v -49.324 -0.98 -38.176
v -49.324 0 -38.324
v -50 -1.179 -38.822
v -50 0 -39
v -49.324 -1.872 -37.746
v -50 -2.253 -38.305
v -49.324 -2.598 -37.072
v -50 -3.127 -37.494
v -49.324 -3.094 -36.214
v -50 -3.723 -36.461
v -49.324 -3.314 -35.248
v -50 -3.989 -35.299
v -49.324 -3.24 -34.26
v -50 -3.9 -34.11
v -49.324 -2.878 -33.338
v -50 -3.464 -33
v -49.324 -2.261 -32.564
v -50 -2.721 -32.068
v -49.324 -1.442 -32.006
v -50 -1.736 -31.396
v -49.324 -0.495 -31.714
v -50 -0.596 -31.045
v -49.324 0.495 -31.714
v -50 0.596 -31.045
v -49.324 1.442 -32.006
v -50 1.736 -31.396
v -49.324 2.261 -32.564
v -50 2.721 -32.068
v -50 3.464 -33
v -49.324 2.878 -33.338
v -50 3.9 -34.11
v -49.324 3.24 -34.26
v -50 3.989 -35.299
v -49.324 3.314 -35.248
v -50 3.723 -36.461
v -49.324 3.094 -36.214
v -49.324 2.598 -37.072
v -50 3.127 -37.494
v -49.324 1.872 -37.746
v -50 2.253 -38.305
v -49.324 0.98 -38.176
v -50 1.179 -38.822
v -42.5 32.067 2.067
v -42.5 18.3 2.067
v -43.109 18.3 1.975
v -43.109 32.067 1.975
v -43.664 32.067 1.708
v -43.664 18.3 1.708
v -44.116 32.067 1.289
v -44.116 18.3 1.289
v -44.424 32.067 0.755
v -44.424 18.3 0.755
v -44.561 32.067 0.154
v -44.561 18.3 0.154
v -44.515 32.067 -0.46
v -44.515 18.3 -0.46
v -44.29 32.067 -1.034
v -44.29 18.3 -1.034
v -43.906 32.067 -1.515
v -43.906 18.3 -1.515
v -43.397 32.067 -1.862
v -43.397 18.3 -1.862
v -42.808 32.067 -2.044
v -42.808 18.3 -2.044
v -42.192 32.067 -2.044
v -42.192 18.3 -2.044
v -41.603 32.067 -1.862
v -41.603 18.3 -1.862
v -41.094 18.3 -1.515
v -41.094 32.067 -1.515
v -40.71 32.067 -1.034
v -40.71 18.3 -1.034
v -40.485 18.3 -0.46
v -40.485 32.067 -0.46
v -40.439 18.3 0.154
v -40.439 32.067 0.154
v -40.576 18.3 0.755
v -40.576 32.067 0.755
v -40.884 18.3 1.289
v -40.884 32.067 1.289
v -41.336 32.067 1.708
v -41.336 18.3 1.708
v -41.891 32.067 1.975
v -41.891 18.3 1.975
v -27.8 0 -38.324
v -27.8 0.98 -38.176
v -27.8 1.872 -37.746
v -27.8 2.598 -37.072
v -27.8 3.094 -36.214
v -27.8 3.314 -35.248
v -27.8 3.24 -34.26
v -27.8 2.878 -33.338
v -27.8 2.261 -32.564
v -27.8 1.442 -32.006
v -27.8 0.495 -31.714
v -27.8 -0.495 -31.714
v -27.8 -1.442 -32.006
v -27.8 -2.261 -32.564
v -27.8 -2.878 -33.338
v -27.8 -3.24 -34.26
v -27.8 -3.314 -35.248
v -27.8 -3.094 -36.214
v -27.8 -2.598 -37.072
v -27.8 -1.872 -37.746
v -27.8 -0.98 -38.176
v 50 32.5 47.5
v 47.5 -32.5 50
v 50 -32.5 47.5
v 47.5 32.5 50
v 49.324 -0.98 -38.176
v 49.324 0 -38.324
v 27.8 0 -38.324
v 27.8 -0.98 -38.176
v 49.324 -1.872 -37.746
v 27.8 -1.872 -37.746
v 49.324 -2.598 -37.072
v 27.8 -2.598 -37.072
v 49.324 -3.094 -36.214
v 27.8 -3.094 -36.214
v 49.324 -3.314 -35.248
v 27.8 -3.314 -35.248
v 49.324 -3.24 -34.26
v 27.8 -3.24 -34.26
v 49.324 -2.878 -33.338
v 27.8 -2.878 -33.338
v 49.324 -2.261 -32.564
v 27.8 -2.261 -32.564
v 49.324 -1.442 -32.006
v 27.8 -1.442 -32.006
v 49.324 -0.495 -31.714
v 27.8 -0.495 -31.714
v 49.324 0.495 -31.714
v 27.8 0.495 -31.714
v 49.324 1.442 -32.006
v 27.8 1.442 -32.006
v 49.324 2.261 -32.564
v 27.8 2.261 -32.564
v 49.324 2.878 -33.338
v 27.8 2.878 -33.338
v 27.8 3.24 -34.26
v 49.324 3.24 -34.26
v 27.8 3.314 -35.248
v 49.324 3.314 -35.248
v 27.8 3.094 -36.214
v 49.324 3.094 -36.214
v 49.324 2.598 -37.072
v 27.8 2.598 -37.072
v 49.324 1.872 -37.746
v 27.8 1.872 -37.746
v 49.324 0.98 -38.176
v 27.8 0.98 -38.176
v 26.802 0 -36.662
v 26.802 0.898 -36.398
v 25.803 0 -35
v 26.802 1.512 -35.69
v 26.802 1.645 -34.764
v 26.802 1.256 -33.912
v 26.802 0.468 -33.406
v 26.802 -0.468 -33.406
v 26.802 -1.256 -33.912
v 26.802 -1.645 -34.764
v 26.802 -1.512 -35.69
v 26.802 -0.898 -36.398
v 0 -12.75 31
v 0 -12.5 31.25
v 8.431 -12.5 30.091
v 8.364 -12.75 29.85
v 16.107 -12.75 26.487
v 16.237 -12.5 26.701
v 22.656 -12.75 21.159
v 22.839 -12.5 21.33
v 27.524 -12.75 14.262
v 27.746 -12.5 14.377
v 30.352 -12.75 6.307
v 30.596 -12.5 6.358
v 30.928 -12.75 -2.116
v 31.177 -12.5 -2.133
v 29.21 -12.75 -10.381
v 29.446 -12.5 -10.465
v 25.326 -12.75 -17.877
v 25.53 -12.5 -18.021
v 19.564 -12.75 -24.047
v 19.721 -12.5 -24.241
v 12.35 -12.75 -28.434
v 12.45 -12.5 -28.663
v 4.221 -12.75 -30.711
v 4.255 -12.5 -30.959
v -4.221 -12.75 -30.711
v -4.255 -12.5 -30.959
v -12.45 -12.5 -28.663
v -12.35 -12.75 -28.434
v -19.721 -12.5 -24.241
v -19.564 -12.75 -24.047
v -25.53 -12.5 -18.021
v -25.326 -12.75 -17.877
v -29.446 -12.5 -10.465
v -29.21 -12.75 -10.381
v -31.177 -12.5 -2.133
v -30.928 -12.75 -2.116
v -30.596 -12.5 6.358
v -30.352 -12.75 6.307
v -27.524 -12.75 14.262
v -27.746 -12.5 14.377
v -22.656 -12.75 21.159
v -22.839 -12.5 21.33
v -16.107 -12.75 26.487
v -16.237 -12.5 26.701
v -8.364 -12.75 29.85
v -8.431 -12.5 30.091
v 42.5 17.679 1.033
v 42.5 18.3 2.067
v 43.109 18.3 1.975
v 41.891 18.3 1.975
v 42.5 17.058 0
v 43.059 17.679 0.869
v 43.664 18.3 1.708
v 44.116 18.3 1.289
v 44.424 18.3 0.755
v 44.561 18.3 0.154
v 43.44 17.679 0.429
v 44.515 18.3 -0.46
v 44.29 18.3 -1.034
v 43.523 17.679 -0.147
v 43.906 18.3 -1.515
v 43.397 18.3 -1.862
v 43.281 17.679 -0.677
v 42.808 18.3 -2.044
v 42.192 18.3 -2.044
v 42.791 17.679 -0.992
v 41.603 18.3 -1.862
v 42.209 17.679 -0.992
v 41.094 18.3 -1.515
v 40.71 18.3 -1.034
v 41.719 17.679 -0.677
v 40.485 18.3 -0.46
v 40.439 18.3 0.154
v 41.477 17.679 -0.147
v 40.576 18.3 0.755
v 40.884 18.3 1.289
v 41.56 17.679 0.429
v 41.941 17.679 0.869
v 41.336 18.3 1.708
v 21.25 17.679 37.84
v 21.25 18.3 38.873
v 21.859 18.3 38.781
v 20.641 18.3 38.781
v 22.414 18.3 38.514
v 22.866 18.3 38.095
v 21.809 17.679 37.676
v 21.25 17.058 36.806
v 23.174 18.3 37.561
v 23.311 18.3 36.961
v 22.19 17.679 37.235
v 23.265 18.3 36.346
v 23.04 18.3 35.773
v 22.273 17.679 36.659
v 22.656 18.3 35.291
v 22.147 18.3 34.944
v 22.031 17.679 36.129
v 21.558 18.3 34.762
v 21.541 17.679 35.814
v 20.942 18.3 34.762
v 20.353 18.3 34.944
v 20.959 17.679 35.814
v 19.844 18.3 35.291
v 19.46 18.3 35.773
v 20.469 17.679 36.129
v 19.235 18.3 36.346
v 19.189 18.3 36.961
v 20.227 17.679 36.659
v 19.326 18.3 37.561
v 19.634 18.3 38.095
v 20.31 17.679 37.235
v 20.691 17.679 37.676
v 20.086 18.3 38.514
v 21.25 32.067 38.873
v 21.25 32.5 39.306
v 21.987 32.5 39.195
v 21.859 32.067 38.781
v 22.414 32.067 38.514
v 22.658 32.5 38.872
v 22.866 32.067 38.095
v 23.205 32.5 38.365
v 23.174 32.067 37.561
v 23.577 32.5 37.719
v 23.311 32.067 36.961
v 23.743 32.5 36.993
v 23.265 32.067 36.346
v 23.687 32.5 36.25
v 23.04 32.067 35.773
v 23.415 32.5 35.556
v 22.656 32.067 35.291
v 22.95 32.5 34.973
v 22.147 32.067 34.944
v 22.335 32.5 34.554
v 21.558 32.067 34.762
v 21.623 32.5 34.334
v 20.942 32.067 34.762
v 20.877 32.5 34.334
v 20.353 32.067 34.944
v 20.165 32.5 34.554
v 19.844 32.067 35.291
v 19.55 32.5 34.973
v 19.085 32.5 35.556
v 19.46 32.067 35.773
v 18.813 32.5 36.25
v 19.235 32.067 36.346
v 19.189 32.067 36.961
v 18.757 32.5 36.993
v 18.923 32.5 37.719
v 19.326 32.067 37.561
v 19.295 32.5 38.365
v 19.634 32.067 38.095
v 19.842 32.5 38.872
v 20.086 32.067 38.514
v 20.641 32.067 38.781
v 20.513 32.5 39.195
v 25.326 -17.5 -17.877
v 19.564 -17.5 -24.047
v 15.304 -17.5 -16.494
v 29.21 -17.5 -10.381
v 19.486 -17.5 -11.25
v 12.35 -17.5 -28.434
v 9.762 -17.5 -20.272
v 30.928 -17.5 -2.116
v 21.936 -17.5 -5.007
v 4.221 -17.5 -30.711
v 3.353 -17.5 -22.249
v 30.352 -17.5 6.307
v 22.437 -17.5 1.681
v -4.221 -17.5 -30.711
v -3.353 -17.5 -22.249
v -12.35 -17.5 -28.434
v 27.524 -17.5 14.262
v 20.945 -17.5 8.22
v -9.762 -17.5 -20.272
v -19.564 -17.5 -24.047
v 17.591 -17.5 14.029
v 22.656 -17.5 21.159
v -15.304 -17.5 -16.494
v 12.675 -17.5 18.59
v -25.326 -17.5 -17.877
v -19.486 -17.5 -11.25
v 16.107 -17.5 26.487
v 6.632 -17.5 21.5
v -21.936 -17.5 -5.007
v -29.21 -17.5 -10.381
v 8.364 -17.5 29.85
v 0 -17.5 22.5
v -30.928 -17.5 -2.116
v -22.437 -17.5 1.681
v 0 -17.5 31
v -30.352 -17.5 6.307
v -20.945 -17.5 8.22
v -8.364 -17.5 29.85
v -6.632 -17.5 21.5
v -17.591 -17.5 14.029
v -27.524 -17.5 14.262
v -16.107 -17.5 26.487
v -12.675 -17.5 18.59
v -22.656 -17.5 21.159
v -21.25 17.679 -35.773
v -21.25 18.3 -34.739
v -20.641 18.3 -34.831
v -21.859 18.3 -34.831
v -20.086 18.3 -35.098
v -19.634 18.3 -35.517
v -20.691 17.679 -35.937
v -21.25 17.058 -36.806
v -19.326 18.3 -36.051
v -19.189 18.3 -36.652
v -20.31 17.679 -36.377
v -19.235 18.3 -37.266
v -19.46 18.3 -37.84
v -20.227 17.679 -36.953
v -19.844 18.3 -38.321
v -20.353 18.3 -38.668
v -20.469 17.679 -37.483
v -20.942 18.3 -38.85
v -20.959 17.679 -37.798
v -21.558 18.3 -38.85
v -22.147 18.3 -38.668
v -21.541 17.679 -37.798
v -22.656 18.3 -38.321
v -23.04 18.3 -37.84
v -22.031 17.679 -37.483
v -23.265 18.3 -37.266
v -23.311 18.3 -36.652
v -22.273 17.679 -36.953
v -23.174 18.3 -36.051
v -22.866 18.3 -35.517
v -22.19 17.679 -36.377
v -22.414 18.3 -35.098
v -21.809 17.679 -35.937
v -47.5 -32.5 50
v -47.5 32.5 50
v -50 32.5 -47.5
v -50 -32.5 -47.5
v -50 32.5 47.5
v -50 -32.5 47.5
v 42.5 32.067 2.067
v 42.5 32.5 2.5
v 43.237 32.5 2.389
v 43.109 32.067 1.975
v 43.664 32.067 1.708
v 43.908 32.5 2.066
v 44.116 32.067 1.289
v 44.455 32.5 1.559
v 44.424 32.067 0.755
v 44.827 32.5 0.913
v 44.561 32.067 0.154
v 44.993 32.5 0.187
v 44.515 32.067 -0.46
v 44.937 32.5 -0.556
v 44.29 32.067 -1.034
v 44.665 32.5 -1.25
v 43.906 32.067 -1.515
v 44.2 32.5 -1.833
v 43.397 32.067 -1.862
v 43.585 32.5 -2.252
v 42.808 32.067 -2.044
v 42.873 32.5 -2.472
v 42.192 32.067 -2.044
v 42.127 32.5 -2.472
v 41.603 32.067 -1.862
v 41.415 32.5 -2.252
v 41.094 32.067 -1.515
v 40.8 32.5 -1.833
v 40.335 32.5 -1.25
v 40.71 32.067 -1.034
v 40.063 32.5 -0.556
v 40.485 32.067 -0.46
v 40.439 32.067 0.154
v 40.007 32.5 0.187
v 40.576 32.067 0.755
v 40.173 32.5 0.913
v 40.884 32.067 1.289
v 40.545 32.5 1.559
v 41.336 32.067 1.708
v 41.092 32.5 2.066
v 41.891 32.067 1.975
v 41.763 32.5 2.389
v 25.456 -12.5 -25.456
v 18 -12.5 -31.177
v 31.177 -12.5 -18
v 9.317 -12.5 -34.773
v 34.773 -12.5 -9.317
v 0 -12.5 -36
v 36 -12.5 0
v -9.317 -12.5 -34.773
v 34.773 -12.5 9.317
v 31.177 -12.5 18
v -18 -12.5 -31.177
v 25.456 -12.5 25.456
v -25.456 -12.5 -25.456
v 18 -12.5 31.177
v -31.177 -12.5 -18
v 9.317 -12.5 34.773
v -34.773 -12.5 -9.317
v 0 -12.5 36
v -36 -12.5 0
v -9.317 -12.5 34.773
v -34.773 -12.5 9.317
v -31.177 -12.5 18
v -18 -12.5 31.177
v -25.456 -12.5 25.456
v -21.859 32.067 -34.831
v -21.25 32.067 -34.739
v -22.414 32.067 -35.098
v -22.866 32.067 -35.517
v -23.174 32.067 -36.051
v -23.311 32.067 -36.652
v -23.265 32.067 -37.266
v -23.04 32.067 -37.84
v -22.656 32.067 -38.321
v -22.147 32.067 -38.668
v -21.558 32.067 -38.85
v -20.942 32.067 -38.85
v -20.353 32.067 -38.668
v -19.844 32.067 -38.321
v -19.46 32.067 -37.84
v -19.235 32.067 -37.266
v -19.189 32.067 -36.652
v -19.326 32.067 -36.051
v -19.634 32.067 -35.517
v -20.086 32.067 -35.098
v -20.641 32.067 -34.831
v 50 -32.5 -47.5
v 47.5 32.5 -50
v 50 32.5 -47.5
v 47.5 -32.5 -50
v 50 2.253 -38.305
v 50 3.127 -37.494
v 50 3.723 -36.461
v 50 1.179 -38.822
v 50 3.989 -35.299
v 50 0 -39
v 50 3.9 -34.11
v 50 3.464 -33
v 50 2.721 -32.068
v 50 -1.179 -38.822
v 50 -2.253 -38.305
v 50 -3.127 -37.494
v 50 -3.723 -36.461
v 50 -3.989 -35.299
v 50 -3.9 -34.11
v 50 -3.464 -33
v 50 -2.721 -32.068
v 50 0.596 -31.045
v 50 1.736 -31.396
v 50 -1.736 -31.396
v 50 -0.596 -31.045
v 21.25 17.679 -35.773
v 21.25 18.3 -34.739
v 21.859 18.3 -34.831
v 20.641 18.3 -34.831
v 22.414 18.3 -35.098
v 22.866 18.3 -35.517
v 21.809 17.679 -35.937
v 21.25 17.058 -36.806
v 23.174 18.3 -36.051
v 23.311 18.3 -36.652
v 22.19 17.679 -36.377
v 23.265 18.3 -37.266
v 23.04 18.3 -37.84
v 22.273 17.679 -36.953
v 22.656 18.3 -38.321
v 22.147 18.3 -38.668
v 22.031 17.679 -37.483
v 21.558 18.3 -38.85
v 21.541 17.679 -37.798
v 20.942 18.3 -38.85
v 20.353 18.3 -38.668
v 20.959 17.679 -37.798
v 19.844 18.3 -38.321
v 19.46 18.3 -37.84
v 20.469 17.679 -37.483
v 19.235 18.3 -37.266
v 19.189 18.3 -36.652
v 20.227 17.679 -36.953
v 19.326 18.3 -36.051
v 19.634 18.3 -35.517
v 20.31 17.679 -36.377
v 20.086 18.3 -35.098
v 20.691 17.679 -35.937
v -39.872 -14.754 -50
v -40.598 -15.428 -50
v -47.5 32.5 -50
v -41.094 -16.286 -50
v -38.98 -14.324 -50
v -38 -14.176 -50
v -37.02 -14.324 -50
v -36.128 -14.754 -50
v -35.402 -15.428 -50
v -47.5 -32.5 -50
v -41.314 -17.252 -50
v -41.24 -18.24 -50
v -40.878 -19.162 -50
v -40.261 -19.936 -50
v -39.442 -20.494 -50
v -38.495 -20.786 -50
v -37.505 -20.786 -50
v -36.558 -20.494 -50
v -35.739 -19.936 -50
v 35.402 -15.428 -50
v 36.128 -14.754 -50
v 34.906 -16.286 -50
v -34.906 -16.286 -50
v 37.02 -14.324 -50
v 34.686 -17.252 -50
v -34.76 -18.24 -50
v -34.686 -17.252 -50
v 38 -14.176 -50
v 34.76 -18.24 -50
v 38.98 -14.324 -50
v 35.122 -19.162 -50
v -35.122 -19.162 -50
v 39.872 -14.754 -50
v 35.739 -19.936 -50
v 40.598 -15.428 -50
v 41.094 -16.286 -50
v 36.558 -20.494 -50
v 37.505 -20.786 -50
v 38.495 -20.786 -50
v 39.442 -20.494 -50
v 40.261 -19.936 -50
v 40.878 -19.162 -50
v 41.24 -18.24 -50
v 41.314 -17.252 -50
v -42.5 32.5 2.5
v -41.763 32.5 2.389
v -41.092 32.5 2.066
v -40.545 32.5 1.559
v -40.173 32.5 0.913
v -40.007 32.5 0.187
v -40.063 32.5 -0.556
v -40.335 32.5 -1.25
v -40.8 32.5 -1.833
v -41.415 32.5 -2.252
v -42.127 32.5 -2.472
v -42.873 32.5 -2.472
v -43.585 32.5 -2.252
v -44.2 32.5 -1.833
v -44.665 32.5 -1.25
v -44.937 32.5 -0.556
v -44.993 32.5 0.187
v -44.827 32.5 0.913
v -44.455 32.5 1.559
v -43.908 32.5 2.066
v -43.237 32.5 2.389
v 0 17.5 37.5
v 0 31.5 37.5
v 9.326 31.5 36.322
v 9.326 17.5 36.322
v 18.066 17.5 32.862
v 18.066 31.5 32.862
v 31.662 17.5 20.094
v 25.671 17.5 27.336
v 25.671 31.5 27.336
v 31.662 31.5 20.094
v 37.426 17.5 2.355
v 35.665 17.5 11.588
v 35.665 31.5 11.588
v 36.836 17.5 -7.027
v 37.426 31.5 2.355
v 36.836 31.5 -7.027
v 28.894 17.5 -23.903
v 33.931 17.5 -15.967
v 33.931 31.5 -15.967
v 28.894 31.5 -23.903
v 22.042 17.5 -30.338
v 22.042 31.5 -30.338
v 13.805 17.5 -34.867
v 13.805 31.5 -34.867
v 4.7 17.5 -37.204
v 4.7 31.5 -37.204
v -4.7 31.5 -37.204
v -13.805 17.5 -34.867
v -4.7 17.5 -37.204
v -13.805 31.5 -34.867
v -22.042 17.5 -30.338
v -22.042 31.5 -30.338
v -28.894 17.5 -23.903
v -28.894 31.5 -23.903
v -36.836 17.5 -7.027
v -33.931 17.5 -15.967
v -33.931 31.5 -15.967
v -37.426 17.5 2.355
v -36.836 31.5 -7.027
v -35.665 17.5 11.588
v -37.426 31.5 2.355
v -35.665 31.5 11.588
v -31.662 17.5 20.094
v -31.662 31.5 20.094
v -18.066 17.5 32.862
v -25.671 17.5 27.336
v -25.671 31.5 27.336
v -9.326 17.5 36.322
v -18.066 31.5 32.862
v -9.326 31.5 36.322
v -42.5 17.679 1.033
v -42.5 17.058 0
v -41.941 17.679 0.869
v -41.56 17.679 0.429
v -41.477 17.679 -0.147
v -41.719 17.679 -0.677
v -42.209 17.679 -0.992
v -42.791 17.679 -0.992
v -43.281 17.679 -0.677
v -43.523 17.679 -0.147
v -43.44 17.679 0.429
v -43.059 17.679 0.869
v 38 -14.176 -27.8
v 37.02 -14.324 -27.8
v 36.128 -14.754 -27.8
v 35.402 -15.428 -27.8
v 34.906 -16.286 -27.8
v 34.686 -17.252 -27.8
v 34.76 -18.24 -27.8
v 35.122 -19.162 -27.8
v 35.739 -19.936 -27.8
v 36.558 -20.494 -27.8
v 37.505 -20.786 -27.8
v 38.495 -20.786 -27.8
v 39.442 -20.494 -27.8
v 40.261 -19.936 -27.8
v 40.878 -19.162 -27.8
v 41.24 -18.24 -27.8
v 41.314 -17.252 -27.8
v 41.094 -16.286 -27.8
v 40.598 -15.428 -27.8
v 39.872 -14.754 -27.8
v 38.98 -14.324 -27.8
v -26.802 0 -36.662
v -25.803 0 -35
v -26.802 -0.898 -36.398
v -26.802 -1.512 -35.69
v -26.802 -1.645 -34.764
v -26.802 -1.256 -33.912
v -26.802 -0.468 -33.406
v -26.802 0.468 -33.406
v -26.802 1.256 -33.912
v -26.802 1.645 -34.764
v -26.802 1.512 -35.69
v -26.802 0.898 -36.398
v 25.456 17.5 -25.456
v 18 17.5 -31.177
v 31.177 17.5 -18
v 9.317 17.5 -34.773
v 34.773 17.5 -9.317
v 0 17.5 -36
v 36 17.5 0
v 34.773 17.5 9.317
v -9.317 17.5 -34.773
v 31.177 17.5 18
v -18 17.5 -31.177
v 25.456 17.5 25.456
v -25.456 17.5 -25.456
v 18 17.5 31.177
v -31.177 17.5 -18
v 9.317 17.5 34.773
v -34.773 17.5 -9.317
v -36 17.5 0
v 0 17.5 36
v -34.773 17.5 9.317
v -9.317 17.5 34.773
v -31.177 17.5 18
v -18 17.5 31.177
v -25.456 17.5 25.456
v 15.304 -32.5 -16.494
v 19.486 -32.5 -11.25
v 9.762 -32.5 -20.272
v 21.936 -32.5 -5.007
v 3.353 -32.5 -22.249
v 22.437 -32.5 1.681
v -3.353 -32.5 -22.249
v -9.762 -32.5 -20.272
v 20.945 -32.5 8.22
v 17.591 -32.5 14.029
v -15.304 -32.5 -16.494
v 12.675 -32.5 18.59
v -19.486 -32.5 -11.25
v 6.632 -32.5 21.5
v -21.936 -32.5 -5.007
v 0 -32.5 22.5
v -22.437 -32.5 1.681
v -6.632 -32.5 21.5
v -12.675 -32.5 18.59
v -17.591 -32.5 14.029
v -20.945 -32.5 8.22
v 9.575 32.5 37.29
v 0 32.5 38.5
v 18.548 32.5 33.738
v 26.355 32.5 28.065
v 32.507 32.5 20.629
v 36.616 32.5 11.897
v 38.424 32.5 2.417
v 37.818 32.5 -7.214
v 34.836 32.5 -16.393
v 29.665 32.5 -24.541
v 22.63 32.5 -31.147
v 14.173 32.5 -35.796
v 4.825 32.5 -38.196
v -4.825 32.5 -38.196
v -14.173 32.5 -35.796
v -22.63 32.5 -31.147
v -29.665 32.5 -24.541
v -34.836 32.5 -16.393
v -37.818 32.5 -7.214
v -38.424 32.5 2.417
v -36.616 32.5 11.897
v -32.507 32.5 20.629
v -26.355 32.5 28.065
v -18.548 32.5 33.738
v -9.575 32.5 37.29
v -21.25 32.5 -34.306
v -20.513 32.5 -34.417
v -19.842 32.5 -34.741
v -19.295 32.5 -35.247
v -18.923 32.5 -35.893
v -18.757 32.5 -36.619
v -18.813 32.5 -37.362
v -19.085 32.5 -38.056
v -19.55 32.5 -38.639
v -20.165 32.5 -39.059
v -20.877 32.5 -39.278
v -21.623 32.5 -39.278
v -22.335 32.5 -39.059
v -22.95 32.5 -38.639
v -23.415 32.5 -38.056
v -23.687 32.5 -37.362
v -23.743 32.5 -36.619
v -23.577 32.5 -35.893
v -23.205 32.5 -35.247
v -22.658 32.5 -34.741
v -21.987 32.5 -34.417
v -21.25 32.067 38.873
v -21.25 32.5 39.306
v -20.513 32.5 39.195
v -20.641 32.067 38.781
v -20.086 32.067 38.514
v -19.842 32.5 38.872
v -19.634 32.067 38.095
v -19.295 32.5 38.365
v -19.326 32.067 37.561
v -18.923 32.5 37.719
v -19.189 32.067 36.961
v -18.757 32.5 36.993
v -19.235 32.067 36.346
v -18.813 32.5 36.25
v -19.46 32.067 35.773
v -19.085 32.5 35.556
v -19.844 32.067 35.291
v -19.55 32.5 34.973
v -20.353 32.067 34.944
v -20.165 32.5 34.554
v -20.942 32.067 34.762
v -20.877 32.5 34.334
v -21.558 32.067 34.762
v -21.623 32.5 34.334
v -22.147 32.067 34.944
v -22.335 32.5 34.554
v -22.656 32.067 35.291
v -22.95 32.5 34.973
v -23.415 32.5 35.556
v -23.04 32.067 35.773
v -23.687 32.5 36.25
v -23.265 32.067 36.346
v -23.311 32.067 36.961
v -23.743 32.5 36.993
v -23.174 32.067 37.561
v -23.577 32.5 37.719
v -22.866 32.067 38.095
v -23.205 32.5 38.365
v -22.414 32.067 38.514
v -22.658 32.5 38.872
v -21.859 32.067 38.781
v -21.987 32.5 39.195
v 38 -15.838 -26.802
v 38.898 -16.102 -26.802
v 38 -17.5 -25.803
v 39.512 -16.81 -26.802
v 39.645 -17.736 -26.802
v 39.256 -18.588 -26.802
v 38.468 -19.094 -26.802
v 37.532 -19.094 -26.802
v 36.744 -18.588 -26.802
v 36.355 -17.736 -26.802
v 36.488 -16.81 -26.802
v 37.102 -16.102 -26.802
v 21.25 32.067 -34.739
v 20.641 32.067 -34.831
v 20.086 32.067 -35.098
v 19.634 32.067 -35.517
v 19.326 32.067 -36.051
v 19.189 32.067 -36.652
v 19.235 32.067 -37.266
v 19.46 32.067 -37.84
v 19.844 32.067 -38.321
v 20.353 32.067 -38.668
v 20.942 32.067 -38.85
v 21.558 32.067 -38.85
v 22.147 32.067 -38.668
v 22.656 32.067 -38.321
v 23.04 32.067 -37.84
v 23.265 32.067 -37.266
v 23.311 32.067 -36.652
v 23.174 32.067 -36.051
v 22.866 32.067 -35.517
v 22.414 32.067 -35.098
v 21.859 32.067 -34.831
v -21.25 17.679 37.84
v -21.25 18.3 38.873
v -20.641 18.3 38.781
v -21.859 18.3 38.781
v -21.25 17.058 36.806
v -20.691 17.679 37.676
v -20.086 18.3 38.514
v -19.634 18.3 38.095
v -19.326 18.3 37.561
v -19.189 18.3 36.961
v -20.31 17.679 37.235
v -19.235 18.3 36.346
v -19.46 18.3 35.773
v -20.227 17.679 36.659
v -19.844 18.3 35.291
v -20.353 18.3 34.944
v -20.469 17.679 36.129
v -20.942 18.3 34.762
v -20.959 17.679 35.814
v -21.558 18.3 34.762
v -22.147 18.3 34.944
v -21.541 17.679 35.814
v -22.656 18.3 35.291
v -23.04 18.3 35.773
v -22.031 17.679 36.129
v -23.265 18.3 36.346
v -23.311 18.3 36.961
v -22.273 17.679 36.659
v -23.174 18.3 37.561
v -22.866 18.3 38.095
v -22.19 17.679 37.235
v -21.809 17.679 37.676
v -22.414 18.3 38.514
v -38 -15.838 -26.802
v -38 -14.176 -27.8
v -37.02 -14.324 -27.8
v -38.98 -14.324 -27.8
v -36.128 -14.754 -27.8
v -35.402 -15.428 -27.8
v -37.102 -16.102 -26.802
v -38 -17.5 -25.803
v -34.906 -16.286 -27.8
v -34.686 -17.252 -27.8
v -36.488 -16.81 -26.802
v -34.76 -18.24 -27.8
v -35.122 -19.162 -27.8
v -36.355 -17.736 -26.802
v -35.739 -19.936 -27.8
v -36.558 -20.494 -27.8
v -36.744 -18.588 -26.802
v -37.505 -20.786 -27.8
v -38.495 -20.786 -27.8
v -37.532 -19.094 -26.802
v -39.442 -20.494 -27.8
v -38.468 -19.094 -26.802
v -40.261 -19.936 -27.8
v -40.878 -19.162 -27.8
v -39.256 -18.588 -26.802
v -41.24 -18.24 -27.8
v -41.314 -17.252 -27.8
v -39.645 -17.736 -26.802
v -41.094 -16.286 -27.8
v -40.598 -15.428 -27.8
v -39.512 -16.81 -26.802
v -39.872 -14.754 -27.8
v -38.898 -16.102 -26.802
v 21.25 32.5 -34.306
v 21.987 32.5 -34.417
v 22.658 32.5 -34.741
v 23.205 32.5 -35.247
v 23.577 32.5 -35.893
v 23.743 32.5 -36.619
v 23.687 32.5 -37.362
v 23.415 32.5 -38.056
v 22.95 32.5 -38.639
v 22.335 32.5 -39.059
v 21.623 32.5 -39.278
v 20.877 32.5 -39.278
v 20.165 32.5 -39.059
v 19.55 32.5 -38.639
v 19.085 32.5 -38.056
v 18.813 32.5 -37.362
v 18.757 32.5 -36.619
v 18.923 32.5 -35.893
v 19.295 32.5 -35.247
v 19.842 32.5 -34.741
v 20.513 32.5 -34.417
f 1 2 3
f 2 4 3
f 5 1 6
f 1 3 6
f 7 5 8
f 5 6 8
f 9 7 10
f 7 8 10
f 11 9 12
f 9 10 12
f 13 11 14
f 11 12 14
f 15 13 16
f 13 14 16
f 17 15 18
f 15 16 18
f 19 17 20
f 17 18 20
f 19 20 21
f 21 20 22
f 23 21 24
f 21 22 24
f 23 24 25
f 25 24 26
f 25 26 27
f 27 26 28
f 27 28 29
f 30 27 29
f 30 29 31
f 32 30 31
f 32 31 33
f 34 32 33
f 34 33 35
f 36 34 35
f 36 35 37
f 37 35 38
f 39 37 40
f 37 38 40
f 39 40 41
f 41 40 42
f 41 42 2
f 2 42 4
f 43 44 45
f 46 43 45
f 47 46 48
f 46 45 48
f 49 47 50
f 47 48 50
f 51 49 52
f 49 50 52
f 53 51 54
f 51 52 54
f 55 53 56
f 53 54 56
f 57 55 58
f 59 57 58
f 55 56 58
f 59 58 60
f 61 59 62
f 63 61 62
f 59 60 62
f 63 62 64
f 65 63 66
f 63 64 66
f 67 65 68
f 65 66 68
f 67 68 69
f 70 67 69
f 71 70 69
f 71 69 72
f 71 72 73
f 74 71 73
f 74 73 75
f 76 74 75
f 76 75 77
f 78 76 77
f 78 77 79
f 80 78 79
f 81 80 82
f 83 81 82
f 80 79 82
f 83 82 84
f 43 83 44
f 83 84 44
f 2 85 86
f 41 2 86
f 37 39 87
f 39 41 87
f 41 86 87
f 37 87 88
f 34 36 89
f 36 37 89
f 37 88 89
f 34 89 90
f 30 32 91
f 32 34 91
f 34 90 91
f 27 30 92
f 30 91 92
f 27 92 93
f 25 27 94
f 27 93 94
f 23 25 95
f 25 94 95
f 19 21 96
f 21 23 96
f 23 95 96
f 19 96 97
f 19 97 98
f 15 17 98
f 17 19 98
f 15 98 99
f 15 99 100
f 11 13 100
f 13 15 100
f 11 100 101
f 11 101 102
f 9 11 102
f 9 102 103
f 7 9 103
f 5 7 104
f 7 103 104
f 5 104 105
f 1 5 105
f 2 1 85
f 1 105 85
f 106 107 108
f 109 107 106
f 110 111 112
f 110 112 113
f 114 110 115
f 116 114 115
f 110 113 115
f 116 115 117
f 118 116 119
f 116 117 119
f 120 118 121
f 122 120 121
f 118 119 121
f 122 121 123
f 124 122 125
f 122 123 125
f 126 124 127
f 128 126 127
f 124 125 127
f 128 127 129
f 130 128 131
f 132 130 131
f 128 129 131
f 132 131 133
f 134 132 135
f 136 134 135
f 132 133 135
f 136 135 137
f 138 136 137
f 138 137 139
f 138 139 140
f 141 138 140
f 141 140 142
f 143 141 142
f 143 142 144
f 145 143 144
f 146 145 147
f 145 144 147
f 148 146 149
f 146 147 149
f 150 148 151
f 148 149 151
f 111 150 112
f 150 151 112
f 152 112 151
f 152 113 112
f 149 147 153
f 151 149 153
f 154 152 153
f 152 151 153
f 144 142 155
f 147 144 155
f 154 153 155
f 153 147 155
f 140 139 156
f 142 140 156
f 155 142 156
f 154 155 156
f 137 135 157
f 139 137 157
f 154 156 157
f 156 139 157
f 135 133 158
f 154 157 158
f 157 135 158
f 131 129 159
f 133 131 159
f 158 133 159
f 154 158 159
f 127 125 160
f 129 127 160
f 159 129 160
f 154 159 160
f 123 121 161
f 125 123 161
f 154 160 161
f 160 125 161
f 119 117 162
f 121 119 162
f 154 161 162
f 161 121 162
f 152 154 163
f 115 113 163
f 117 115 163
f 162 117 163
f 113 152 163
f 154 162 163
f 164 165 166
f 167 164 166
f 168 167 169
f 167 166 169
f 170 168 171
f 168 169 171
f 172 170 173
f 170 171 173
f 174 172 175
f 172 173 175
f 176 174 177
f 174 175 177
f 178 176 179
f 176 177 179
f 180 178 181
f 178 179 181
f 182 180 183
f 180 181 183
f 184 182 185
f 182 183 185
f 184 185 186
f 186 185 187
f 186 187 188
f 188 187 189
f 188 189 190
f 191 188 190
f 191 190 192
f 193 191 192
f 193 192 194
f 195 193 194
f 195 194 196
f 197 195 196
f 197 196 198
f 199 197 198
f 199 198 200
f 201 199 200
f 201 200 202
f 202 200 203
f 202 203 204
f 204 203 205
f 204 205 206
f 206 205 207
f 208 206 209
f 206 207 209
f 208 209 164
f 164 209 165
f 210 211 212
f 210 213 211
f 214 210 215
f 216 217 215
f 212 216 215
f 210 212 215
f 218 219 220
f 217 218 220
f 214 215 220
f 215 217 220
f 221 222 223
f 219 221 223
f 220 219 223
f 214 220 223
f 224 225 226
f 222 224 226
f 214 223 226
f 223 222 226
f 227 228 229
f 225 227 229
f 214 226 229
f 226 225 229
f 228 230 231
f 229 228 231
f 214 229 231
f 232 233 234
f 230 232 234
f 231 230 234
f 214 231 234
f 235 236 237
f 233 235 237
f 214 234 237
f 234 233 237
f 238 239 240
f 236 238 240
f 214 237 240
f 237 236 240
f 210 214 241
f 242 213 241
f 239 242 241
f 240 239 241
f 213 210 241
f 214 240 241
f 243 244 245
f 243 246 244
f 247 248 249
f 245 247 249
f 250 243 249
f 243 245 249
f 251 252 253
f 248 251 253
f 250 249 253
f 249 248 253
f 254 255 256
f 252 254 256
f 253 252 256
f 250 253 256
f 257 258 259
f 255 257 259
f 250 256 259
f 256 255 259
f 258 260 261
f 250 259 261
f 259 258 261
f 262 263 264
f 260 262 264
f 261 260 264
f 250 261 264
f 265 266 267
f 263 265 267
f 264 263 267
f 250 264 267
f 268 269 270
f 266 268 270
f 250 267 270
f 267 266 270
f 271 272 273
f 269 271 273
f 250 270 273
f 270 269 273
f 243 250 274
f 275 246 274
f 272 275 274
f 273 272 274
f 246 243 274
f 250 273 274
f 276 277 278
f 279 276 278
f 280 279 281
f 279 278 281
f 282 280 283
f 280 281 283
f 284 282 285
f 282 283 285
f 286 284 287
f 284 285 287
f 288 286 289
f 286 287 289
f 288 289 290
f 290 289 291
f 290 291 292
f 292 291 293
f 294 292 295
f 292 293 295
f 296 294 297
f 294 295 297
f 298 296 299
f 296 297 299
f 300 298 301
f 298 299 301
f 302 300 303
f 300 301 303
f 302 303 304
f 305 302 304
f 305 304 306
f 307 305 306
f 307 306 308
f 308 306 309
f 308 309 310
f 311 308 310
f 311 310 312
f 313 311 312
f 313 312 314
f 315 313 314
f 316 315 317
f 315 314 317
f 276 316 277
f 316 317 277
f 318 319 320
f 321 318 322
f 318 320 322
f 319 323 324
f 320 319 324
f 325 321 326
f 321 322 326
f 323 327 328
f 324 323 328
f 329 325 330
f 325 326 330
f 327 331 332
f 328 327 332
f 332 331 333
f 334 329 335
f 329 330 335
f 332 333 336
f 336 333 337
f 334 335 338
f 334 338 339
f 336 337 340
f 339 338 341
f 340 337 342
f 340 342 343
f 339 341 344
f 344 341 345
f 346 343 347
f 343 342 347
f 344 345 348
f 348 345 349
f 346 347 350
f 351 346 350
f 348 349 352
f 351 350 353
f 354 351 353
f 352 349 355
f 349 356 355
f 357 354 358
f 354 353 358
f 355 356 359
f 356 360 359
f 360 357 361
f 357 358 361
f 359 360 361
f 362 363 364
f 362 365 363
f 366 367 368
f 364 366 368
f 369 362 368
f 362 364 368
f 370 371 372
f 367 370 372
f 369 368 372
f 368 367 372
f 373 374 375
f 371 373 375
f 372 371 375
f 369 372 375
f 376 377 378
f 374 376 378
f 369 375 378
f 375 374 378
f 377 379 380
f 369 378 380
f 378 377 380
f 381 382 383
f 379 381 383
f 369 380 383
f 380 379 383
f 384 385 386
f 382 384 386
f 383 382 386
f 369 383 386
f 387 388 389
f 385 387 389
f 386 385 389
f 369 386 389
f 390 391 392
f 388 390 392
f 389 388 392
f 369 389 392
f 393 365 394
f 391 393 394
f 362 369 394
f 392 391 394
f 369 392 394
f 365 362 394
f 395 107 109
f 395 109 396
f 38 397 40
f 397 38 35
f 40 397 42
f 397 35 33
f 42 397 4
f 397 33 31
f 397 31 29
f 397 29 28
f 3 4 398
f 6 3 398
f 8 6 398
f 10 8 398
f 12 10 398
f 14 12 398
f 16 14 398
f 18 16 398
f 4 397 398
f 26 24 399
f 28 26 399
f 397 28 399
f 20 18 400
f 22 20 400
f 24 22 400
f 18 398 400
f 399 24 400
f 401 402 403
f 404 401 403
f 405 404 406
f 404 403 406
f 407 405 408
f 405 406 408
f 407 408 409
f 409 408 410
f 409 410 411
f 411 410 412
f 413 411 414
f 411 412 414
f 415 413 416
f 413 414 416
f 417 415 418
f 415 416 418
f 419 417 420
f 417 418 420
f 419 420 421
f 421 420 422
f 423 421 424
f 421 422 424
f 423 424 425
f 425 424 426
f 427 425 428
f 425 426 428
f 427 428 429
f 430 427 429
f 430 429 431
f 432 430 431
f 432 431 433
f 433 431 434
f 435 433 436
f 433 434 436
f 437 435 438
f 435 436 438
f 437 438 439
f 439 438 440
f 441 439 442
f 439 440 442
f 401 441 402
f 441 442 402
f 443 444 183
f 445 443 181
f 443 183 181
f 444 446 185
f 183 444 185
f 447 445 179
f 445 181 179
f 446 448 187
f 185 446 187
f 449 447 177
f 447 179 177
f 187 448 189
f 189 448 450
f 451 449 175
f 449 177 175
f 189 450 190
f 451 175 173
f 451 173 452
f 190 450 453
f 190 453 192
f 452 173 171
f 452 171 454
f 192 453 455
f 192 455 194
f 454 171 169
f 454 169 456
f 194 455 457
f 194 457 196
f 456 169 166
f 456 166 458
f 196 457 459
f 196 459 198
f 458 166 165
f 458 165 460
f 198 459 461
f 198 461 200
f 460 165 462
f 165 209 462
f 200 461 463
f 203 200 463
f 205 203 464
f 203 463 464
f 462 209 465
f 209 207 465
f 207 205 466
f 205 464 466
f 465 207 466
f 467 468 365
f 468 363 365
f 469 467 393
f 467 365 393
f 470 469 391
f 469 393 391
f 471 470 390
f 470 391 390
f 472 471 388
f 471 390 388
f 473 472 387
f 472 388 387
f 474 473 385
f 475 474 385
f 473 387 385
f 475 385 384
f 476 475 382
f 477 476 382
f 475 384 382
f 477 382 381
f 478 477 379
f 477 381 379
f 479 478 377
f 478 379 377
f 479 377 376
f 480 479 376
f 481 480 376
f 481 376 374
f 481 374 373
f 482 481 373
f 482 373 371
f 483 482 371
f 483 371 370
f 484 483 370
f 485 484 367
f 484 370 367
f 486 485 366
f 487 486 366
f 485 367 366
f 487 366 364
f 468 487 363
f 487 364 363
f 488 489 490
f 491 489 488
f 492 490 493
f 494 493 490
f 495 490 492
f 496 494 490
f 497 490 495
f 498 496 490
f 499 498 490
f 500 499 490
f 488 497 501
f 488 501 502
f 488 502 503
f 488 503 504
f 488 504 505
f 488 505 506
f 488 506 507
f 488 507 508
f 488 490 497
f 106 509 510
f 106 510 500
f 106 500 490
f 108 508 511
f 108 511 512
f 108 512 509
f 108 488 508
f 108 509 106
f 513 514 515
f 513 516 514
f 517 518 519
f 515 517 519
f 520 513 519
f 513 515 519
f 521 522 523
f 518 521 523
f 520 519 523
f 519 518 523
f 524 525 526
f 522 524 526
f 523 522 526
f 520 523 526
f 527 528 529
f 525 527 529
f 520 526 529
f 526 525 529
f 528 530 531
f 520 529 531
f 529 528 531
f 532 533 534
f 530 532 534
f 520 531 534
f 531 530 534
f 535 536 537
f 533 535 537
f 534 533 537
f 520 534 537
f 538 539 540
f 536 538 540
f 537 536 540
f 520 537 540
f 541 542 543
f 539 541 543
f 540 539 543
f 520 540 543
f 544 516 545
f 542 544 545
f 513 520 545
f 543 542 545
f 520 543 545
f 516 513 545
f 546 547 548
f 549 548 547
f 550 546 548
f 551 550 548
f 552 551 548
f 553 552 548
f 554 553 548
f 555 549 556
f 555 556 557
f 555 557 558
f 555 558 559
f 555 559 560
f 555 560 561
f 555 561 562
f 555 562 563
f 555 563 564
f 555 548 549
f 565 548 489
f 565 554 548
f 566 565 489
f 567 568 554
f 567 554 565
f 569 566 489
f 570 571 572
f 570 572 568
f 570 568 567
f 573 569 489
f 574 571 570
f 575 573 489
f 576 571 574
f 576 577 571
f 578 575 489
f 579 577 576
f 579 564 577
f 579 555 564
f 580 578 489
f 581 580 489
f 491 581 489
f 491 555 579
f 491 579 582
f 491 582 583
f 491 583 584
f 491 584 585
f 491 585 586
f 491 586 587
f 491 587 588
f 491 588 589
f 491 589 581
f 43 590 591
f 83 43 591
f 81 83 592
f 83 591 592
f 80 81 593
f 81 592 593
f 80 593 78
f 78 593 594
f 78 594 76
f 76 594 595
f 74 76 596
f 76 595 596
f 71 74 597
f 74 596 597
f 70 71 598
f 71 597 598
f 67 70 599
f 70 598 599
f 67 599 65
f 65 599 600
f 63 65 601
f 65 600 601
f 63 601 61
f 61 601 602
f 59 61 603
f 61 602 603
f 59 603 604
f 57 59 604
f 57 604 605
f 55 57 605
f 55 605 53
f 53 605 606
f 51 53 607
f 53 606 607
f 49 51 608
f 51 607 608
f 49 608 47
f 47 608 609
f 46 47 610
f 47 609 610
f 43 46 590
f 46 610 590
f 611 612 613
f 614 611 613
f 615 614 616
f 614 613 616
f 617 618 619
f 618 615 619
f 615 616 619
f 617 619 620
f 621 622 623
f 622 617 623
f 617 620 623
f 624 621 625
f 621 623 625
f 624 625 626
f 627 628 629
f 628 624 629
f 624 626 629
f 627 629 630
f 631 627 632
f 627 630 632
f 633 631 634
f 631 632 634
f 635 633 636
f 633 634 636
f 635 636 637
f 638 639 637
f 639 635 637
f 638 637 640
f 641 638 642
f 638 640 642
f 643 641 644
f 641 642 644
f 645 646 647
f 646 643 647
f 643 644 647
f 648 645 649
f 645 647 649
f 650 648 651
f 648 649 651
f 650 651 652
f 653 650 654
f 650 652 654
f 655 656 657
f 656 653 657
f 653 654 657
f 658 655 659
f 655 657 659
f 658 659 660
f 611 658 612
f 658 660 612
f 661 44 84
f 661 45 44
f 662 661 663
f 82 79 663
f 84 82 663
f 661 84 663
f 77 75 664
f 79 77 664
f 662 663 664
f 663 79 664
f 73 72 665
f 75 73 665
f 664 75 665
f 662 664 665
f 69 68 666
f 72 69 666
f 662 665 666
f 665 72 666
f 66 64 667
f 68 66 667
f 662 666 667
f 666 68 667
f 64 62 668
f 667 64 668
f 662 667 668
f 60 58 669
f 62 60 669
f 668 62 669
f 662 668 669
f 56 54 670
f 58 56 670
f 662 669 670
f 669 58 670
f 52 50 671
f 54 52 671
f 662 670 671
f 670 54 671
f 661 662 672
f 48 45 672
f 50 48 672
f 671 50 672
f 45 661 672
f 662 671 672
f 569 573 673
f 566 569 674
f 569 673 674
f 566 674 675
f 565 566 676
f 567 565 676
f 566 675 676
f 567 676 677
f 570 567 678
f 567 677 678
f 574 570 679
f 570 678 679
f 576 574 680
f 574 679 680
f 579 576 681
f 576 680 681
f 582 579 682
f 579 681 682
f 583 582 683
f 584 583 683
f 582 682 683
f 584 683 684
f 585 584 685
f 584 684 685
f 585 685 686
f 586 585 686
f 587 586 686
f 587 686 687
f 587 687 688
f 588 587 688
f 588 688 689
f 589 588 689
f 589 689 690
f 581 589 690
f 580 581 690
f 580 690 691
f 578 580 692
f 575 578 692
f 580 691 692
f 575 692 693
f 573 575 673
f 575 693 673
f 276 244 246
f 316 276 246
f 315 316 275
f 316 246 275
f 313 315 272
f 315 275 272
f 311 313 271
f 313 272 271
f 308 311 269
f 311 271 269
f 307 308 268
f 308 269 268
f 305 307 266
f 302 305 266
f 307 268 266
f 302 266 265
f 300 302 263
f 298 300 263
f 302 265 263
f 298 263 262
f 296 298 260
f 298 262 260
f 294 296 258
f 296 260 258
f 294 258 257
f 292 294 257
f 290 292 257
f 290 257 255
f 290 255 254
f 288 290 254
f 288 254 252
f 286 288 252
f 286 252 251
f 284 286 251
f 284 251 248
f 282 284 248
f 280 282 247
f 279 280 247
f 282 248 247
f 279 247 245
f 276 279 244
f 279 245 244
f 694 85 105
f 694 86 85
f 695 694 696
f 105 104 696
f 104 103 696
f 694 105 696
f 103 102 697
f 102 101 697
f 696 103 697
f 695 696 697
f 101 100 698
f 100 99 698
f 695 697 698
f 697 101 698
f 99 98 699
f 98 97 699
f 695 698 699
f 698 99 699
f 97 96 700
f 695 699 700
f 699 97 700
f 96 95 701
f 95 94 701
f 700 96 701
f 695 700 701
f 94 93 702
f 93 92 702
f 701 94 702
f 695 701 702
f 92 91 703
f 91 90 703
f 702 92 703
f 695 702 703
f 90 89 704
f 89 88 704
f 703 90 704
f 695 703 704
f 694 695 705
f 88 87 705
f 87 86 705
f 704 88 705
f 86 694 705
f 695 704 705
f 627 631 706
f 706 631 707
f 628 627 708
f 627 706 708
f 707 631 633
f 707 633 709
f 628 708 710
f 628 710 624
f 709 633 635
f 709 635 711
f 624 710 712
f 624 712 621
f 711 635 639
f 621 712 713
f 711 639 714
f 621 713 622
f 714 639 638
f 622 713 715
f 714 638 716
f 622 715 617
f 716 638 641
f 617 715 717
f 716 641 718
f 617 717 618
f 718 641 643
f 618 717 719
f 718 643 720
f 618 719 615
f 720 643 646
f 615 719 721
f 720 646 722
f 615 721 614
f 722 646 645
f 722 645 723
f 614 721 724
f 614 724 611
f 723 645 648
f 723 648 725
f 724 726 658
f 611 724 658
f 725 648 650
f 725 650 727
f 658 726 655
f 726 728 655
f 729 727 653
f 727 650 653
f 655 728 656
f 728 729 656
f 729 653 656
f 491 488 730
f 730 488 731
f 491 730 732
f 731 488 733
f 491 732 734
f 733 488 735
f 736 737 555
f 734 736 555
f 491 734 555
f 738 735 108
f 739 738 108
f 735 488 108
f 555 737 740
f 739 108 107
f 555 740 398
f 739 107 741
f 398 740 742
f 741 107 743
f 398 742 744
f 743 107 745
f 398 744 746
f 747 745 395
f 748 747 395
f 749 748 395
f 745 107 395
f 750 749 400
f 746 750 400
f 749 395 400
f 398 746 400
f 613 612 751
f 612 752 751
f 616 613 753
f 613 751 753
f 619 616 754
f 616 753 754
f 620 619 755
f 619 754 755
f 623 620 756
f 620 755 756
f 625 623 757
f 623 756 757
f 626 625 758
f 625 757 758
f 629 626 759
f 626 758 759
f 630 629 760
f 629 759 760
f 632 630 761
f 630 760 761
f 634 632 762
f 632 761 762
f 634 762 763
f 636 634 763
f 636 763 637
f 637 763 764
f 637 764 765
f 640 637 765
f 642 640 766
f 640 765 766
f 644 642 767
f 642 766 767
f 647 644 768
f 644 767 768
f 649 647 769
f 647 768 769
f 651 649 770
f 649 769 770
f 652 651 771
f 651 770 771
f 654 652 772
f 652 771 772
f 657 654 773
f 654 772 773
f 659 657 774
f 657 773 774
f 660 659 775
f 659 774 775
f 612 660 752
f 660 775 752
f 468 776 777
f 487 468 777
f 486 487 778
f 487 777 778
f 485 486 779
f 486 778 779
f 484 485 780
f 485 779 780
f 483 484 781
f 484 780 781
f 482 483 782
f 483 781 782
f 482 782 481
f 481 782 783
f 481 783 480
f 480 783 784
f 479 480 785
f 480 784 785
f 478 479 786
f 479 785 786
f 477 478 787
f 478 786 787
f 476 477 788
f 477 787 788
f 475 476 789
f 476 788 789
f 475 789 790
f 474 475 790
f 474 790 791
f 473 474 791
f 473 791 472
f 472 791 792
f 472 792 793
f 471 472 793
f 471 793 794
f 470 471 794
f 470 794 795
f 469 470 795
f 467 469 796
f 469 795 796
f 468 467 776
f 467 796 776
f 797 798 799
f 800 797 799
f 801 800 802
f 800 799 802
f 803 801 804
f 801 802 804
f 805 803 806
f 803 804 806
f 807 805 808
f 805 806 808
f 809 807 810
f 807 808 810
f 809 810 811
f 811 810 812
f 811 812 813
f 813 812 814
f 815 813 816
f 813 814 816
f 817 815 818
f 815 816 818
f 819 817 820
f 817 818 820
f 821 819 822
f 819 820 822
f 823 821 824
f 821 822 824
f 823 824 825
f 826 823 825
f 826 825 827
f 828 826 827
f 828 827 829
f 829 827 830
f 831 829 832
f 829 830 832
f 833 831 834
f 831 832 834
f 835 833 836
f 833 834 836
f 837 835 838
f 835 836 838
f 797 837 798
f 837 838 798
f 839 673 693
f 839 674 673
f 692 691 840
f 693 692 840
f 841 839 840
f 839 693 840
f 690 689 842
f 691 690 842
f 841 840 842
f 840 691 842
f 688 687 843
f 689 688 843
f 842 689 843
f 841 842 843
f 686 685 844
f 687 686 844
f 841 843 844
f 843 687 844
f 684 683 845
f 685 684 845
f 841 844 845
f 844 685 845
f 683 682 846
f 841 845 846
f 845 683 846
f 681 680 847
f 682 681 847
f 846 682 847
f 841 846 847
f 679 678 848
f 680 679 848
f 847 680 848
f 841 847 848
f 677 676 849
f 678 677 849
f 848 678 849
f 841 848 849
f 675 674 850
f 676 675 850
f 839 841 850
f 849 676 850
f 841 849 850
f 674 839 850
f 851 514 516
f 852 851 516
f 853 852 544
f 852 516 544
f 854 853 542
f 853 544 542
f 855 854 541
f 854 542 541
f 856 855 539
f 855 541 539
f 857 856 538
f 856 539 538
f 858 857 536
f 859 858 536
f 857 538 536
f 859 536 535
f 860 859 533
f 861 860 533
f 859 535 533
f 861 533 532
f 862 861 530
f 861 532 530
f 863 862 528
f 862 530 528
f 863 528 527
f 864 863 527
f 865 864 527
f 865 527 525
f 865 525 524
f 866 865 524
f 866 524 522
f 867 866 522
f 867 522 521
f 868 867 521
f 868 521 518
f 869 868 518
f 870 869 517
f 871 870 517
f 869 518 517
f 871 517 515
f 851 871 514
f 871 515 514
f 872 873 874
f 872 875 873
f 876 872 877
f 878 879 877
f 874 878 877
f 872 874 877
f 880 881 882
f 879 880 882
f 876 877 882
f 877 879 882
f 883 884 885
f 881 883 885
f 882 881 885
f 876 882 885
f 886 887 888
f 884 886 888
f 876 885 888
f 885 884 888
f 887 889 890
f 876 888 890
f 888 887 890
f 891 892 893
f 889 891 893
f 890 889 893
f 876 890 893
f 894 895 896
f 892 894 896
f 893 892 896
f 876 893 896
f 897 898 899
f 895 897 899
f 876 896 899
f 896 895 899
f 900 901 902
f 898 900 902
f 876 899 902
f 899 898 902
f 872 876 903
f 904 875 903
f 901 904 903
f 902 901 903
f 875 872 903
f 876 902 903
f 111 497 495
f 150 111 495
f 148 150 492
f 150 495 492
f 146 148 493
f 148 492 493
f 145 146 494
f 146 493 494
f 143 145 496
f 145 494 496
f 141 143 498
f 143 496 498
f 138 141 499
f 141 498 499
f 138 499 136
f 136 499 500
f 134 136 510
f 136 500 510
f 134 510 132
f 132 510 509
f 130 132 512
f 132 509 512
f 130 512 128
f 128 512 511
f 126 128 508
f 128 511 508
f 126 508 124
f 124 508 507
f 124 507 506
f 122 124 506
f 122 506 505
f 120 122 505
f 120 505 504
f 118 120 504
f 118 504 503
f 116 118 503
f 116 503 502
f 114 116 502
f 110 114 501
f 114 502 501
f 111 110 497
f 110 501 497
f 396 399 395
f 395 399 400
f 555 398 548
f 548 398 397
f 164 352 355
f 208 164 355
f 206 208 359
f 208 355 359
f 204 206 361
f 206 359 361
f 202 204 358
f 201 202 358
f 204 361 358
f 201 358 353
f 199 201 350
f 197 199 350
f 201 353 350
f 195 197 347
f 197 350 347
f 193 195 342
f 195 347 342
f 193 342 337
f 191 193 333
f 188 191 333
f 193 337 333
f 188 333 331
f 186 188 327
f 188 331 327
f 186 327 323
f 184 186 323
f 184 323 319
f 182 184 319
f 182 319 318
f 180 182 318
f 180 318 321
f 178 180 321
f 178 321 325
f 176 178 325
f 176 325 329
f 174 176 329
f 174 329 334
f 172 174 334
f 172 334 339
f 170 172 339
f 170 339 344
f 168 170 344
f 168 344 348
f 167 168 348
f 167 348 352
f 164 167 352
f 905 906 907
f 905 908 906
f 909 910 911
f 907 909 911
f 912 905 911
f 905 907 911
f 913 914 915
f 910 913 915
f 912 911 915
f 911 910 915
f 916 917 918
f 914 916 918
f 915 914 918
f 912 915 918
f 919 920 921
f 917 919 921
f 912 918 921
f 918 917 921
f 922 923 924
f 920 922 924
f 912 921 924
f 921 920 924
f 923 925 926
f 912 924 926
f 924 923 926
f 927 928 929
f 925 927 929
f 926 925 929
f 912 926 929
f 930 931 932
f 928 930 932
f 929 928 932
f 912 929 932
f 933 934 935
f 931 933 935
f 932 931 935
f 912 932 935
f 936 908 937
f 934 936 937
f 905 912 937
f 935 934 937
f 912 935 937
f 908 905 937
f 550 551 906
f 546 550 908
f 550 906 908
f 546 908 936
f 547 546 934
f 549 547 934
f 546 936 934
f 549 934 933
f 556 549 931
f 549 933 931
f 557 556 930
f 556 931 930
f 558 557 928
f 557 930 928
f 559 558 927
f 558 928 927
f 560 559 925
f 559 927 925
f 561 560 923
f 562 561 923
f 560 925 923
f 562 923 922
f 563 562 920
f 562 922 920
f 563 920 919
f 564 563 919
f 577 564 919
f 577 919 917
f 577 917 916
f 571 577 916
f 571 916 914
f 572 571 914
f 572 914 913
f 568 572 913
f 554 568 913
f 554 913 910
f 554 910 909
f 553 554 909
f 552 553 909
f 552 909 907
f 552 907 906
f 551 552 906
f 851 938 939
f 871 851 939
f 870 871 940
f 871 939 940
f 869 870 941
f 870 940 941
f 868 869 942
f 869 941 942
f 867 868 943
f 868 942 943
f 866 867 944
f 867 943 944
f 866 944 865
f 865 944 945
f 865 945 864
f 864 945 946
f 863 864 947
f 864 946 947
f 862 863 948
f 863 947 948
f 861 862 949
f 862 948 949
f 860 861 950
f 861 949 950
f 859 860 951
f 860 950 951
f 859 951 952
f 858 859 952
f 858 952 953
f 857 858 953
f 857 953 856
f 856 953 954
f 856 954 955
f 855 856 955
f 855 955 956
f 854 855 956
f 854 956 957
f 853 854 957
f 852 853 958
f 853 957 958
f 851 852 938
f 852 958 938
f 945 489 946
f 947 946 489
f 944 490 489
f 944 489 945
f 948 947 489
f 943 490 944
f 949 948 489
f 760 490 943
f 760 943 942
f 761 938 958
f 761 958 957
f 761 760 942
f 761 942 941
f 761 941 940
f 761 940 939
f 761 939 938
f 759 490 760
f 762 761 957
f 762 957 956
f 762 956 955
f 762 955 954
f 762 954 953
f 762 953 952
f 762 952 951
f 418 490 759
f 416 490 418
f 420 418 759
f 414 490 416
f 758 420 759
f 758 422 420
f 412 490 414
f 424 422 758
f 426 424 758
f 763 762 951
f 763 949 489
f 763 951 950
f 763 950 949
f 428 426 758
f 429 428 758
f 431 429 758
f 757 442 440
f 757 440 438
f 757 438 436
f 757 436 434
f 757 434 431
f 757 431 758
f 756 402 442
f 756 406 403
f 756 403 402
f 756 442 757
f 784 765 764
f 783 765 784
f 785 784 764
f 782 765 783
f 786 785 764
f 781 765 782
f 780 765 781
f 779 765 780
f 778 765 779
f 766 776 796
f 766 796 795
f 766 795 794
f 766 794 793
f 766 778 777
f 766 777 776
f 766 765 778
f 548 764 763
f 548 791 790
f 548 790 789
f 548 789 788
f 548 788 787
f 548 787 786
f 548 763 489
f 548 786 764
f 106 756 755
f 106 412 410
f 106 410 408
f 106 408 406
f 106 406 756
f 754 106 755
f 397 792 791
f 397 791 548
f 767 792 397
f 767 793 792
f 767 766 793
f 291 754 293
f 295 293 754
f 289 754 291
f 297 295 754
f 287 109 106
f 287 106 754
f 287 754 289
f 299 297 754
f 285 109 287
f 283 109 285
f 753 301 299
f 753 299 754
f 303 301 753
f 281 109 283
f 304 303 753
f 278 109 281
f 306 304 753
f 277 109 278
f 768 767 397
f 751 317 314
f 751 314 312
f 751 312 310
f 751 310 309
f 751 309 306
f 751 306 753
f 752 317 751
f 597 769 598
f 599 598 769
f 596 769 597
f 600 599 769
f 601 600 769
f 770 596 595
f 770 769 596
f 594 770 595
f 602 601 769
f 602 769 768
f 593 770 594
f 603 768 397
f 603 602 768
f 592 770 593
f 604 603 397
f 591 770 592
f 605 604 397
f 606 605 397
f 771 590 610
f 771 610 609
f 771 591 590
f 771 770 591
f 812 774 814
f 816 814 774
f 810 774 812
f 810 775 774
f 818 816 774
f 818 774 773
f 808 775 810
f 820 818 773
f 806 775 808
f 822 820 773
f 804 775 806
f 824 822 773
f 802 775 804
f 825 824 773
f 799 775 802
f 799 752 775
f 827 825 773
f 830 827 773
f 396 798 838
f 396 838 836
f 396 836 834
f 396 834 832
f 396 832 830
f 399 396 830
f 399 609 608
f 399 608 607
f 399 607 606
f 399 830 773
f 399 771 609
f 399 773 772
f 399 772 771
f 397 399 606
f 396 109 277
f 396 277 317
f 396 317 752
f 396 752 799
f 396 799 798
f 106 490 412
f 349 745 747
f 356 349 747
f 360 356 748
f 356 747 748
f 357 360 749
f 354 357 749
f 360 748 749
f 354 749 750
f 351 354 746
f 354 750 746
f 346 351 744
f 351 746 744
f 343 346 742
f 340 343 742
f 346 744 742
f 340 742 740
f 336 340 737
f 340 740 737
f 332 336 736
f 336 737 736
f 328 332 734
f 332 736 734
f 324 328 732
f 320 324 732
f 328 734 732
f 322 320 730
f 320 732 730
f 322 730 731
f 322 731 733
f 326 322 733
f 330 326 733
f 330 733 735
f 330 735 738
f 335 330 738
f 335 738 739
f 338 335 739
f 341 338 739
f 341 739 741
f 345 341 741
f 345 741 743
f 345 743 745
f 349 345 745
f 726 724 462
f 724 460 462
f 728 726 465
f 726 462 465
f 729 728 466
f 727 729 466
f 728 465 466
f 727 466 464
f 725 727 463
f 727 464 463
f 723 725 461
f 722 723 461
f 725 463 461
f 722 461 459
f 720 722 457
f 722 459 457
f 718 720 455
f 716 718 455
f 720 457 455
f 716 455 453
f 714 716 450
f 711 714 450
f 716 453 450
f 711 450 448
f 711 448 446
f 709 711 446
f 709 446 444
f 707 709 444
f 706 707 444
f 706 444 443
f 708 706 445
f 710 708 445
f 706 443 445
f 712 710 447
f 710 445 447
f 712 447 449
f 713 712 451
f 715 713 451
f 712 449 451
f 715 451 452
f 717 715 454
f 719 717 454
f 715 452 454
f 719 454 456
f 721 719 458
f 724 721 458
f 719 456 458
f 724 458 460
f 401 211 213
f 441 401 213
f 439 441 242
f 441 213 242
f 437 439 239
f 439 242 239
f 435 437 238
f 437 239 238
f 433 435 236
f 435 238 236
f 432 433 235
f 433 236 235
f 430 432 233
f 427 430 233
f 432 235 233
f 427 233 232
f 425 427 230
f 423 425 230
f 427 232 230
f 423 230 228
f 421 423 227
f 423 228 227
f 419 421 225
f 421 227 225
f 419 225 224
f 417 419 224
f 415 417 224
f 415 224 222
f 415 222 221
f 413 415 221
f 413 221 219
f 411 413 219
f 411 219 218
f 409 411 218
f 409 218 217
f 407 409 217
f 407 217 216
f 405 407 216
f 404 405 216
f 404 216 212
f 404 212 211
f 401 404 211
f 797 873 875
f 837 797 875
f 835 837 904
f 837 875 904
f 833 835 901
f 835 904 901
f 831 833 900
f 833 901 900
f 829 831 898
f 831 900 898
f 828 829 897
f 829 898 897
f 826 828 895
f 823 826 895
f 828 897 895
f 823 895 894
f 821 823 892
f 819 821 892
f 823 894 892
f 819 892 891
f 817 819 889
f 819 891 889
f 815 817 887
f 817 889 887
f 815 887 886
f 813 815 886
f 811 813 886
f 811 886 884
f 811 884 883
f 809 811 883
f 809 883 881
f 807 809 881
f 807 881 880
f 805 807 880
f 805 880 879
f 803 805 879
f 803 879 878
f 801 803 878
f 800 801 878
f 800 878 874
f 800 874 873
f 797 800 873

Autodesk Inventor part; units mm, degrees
ref_plane "YZ Plane" through (0, 0, 0) normal (1, 0, 0) x (0, 1, 0)
ref_plane "XZ Plane" through (0, 0, 0) normal (0, 1, 0) x (-1, 0, 0)
ref_plane "XY Plane" through (0, 0, 0) normal (0, 0, 1) x (1, 0, 0)
sketch "Skizze1" plane through (0, 0, 0) normal (0, 1, 0) x (-1, 0, 0)
  line L0 (0, -50) -> (-50, -50)
  line L1 (-50, -50) -> (-50, 50)
  line L2 (-50, 50) -> (0, 50)
  line L3 (0, -50) -> (50, -50)
  line L4 (50, -50) -> (50, 50)
  line L5 (50, 50) -> (0, 50)
  line L6 (-122.5, 0) -> (122.5, 0) construction
  line L7 (0, -77.2) -> (0, 113.2) construction
  dimension "d1" = 100
  dimension "d3" = 100
extrude "Grundkoerper" add sketch "Skizze1" along normal mid plane 65
sketch "Skizze2" plane through (0, -32.5, 0) normal (0, -1, 0) x (1, 0, 0)
  line L0 (-50, -50) -> (50, -50) projected
  line L1 (50, 50) -> (-50, 50) projected
  point P0 (0, 0)
  point P1 (0, 0)
  point P2 (-87.5, 0)
  point P3 (87.5, 0)
  dimension "d8" = 0
sketch "Skizze3" plane through (0, 0, 0) normal (1, 0, 0) x (0, 1, 0)
  line L0 (49, 0) -> (-49, 0) construction
  line L1 (-32.5, 50) -> (-32.5, -50) construction
  line L2 (32.5, -50) -> (32.5, 50) construction
  line L3 (17.5, 36) -> (-12.5, 36)
  line L4 (-12.5, 36) -> (-12.5, 31)
  line L5 (-17.5, 22.5) -> (-32.5, 22.5)
  line L6 (-32.5, -50) -> (-32.5, 50) projected
  line L7 (-32.5, 22.5) -> (-32.5, 0)
  line L8 (-32.5, 0) -> (32.5, 0)
  line L9 (32.5, 0) -> (32.5, 37.5)
  line L10 (-12.5, 31) -> (-17.5, 31)
  line L11 (-17.5, 31) -> (-17.5, 22.5)
  line L12 (17.5, 36) -> (17.5, 37.5)
  line L13 (17.5, 37.5) -> (32.5, 37.5)
  point P0 (0, 0)
  dimension "d9" = 45
  dimension "d10" = 72
  dimension "d11" = 45
  dimension "d33" = 5
  dimension "d34" = 62
  dimension "d160" = 75
  dimension "d161" = 30
revolve "Lagersitz" cut sketch "Skizze3" angle 360 about axis through (0, -32.5, 0) along (0, -1, 0)
sketch "Skizze_Lagersitz" plane through (0, 0, 0) normal (1, 0, 0) x (0, 1, 0)
  line L0 (-12.5, 36) -> (17.5, 36) projected
  line L1 (-12.5, -36) -> (-12.5, 36) projected
  line L2 (-17.5, 31) -> (-12.5, 31) projected
  line L3 (-17.5, -31) -> (-17.5, 31) projected
  line L4 (-32.5, 22.5) -> (-17.5, 22.5) projected
  line L5 (-32.5, -22.5) -> (-17.5, -22.5) projected
  line L6 (-17.5, -31) -> (-12.5, -31) projected
  line L7 (-12.5, -36) -> (17.5, -36) projected
  line L8 (32.5, 50) -> (32.5, -50) projected
  line L9 (30, -50) -> (30, 0) projected
  line L10 (-32.5, -22.5) -> (-32.5, 22.5) projected
  line L11 (-32.5, 50) -> (-32.5, -50) projected
  line L12 (-32.5, -50) -> (-32.5, 50) projected
  line L13 (-12.5, -36) -> (-12.5, 36) projected
  line L14 (17.5, -37.5) -> (17.5, 37.5) projected
  line L15 (17.5, 37.5) -> (32.5, 37.5) projected
  point P0 (0, 0)
  point P1 (30, 86)
  point P2 (30, 14)
  point P3 (-30, 32)
  point P4 (-30, 68)
  point P5 (32.5, 36)
  point P6 (32.5, -36)
sketch "Skizze5" plane through (0, 32.5, 0) normal (0, 1, 0) x (1, 0, 0)
  line L0 (0, 77.2) -> (0, -113.2) construction
  circle A0 centre (0, 0) radius 42.5 construction
  line L1 (122.5, 0) -> (-122.5, 0) construction
  point P0 (42.5, 0)
  point P1 (21.25, 36.8061)
  point P2 (-21.25, 36.8061)
  point P3 (-42.5, 0)
  point P4 (-21.25, -36.8061)
  point P5 (21.25, -36.8061)
  dimension "d167" = 85
  dimension "d170" = 360
hole "M5x10_Deckel" at (42.5, 32.5, 0) at (21.25, 32.5, -36.8061) at (-21.25, 32.5, -36.8061) at (-42.5, 32.5, 0) at (-21.25, 32.5, 36.8061) at (21.25, 32.5, 36.8061) direction (0, -1, 0) diameter 4.134 depth 14.2 tip angle 118 countersink diameter 5 countersink angle 90 thread size "M5x0.8" class "6H" standard "ISO Metric profile"
sketch "Skizze9" plane through (50, -32.5, -50) normal (1, 0, 0) x (0, 0, -1)
  line L0 (-50, 81.5) -> (-50, -16.5) construction
  line L1 (0, 65) -> (0, 0) construction
  line L2 (-100, 65) -> (0, 65) construction
  line L3 (0, 0) -> (-100, 0) construction
  line L4 (-163.2, 32.5) -> (27.2, 32.5) construction
  point P0 (-50, 32.5)
  point P1 (-15, 32.5)
  dimension "d94" = 50
  dimension "d95" = 15
hole "M8x16_Seite" at (50, 0, -35) direction (-1, 0, 0) diameter 6.647 depth 22.2 tip angle 118 countersink diameter 8 countersink angle 90 thread size "M8x1.25" class "6H" standard "ISO Metric profile"
mirror "M8x16_Seite_Spiegel" about plane through (0, 0, 0) normal (1, 0, 0) of "M8x16_Seite"
sketch "Skizze16" plane through (50, 32.5, -50) normal (0, 0, -1) x (-1, 0, 0)
  line L0 (50, -78) -> (50, 13) construction
  line L1 (100, -65) -> (0, -65) construction
  line L2 (100, 0) -> (100, -65) projected
  point P0 (50, -32.5)
  point P1 (88, -50)
  point P2 (12, -50)
  dimension "d181" = 76
  dimension "d182" = 15
  dimension "d183" = 12
hole "M8x16_Boden" at (-38, -17.5, -50) at (38, -17.5, -50) direction (0, 0, 1) diameter 6.647 depth 22.2 tip angle 118 thread size "M8x1.25" class "6H" standard "ISO Metric profile"
chamfer "Fase_Lagersitz" distance 0.25 angle 45 1 edges at (0, -12.5, -31)
chamfer "Fase_Deckel" distance 1 angle 45 1 edges at (0, 32.5, -37.5)
chamfer "Fase_Allgemein" distance 2.5 angle 45 4 edges at (50, 0, 50) (-50, 0, 50) (50, 0, -50) (-50, 0, -50)
properties part number "200-10-ROCKER-BEARING-01" material "Aluminium 6061"
